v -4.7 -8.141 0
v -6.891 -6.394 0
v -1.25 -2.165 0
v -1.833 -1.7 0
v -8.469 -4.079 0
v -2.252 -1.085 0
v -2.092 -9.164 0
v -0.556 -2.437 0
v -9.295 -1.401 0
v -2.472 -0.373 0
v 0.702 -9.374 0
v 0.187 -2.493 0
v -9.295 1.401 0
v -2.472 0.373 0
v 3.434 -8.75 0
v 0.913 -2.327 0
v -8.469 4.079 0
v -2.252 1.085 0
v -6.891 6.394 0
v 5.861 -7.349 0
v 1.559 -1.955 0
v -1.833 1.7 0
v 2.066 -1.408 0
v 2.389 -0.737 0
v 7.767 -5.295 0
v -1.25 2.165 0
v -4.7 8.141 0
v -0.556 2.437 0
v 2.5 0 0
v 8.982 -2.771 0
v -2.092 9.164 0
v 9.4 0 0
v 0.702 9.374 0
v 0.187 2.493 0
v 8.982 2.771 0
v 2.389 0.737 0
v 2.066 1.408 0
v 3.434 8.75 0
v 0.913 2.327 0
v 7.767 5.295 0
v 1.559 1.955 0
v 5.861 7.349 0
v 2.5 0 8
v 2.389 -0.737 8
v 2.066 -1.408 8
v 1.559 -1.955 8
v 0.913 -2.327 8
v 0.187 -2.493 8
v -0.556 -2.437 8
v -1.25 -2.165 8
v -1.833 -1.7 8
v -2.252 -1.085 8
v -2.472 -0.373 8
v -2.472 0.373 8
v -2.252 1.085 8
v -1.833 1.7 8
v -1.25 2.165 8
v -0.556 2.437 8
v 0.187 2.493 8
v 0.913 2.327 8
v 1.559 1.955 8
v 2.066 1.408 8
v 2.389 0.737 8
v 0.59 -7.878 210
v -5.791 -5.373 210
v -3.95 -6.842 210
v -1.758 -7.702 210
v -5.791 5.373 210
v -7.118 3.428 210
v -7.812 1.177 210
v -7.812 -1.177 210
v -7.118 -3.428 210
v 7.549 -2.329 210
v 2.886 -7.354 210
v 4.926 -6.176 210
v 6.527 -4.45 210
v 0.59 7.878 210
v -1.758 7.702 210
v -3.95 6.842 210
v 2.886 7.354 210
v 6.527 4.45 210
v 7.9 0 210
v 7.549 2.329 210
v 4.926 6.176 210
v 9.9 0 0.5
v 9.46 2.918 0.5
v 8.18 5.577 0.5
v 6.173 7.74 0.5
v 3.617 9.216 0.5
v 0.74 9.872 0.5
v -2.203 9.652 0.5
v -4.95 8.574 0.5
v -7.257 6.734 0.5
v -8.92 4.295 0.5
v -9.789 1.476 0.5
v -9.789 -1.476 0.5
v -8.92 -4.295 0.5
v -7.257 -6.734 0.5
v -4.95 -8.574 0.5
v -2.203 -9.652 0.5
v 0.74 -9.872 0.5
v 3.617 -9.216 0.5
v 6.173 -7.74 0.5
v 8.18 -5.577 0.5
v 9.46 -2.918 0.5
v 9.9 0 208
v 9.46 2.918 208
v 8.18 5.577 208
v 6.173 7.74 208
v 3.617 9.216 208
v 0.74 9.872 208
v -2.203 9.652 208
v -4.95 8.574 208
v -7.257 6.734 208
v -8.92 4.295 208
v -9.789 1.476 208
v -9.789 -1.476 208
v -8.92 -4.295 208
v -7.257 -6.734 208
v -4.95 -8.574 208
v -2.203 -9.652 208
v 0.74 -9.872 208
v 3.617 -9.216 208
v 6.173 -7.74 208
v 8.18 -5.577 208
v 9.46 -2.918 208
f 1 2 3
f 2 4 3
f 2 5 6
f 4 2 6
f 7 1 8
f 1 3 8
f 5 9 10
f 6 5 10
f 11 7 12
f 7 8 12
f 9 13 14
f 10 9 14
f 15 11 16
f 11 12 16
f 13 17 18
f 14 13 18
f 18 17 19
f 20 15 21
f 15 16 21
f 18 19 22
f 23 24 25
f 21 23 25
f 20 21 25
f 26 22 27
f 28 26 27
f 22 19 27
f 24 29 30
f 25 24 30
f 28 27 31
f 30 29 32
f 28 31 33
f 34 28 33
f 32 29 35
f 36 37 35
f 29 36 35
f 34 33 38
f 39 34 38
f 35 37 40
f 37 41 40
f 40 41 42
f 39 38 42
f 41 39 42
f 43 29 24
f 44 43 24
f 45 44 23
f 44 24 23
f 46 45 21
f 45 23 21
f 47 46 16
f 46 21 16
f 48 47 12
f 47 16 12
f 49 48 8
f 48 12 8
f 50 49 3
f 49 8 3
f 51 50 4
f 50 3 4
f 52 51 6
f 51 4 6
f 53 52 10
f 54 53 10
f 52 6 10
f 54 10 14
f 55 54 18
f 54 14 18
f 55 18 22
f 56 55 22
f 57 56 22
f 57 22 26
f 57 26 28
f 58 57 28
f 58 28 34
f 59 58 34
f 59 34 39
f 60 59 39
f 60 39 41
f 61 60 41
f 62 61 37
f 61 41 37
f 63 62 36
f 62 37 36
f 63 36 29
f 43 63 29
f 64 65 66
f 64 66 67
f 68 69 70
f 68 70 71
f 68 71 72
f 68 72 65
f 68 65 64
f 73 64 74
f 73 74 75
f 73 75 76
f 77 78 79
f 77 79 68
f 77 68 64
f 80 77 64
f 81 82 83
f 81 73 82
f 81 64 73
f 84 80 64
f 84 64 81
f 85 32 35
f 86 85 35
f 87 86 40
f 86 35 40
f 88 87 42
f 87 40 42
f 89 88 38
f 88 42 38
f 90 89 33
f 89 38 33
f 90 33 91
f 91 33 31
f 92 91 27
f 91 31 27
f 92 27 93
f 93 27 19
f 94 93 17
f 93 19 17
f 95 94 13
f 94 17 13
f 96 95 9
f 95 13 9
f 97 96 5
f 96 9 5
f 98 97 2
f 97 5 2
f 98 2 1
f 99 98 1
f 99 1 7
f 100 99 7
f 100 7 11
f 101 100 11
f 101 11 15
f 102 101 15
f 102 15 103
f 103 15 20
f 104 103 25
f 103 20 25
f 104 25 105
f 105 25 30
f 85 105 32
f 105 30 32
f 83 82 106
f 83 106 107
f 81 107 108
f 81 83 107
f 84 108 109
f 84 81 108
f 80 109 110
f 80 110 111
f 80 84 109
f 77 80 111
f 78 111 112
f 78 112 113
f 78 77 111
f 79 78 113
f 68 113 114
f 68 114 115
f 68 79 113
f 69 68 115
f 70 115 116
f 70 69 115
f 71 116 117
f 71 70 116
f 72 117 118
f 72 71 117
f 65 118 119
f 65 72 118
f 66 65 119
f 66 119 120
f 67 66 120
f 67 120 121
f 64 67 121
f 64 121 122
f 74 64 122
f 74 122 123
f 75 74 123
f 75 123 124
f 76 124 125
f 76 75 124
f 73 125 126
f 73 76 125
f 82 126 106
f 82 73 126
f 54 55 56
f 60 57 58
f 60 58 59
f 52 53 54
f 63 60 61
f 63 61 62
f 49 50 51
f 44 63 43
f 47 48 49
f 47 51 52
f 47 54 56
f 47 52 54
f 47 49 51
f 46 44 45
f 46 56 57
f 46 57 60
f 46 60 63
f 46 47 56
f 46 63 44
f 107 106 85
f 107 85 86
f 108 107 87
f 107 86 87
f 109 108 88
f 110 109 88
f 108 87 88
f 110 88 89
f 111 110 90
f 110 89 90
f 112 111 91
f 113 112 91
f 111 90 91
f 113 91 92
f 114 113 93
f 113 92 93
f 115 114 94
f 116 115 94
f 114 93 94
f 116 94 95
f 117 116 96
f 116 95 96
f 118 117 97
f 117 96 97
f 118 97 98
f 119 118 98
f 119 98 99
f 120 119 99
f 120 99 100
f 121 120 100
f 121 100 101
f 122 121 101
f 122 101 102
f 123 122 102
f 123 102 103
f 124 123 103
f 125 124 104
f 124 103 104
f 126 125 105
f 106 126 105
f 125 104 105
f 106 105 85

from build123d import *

# Parameters (mm, degrees)
F0_R     = 9.9
F1_DEPTH = 210
F2_SIZE  = 2
F3_R     = 2.5
F4_DEPTH = 8
F5_SIZE  = 0.5


with BuildPart() as f1:
    # F0 (on Top) → F1 (new body)
    with BuildSketch(Plane.XY):
        Circle(F0_R)
    extrude(amount=F1_DEPTH)

    # F2
    f2_edges = [f1.edges().sort_by_distance(p)[0] for p in [
        (-9.9, 0, 210),
    ]]
    chamfer(f2_edges, length=F2_SIZE)

    # F3 (on face) → F4 (cut)
    with BuildSketch(Plane(origin=(0, 0, 0), x_dir=(1, 0, 0), z_dir=(0, 0, -1))):
        Circle(F3_R)
    extrude(amount=-F4_DEPTH, mode=Mode.SUBTRACT)

    # F5
    f5_edges = [f1.edges().sort_by_distance(p)[0] for p in [
        (-9.9, 0, 0),
    ]]
    chamfer(f5_edges, length=F5_SIZE)


solid = f1.part
